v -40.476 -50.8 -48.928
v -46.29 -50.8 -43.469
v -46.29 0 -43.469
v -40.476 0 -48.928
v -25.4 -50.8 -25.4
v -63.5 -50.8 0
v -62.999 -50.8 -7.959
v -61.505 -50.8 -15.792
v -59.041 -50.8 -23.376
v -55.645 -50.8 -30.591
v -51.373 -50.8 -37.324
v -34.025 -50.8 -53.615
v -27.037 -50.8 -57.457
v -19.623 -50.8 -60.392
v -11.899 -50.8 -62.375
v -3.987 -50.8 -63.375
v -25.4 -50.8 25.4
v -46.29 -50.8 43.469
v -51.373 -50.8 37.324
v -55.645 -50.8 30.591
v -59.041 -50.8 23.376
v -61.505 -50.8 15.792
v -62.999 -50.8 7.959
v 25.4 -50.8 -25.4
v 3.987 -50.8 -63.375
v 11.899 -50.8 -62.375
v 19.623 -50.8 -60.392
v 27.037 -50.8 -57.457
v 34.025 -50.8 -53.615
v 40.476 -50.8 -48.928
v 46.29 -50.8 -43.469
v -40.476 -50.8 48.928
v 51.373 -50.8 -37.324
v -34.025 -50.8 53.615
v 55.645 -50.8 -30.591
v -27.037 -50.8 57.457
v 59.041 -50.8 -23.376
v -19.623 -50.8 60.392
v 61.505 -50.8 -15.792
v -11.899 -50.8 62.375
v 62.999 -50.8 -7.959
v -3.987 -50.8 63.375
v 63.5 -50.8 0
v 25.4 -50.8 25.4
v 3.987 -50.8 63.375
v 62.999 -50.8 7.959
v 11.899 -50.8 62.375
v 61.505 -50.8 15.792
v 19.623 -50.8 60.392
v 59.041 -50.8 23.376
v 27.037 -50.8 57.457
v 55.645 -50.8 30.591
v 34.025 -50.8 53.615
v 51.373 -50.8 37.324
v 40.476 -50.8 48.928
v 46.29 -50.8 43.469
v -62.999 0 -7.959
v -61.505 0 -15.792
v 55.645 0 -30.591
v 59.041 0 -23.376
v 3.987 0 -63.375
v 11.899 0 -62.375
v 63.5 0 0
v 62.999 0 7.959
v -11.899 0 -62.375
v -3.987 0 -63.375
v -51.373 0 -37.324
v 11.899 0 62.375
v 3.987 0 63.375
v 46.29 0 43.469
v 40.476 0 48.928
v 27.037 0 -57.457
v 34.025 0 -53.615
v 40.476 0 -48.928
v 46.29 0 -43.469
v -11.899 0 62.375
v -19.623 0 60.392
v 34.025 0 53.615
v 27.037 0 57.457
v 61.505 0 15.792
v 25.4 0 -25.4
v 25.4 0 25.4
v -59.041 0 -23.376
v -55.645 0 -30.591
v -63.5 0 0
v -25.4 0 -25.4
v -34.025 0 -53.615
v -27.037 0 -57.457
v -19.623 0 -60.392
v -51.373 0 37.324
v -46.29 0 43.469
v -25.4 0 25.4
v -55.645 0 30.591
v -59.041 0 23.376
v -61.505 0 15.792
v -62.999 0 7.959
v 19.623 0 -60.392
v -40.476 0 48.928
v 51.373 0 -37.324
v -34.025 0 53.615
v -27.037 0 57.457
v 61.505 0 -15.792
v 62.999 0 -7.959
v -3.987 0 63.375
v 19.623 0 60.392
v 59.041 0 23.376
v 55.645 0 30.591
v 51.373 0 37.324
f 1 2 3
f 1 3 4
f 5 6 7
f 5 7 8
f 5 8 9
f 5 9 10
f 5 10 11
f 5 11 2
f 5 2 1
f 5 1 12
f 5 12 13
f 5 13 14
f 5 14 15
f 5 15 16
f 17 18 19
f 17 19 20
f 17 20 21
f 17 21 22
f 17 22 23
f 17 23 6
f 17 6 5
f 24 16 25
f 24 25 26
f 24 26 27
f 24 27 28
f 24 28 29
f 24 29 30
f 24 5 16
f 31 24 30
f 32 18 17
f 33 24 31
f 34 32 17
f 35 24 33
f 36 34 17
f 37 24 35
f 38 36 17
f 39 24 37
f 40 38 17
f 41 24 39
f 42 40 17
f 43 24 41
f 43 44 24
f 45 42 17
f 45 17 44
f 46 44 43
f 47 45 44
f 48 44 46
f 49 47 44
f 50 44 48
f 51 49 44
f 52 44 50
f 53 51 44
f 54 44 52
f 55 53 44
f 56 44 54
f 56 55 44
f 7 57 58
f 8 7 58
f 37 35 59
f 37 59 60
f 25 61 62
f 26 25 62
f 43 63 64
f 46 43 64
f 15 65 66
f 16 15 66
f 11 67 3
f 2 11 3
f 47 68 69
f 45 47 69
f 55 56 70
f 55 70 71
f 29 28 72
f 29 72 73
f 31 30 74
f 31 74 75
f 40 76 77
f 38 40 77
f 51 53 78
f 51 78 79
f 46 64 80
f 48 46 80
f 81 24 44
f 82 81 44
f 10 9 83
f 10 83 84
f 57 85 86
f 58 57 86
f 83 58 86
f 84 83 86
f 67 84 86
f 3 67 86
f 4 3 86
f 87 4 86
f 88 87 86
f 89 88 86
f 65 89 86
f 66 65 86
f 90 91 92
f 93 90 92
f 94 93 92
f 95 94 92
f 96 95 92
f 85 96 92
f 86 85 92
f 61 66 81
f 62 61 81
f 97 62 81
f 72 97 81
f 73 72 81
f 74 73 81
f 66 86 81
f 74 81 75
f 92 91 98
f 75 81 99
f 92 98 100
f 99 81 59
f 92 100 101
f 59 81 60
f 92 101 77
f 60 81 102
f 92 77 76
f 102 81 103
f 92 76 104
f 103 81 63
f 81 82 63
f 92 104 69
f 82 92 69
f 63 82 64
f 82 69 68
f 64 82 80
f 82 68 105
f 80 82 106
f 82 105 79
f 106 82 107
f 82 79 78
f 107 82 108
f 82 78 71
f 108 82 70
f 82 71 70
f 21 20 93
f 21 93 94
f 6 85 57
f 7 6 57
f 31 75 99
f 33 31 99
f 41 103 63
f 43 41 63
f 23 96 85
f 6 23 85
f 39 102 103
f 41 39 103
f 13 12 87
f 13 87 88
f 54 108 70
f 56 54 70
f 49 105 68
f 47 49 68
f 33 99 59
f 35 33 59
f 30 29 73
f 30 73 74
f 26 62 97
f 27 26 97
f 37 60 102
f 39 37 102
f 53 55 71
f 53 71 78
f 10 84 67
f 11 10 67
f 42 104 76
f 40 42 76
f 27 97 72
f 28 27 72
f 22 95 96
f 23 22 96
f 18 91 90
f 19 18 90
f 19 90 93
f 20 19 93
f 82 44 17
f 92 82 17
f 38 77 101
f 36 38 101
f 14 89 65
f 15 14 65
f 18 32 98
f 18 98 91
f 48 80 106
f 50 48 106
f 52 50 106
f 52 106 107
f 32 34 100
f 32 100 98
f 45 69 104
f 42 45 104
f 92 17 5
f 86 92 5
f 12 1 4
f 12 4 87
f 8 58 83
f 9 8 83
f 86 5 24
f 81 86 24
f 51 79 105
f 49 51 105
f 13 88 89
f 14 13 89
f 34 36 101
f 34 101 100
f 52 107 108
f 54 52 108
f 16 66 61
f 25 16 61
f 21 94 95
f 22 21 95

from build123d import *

# Parameters (mm, degrees)
F1_DEPTH = 50.8
F3_DEPTH = 76.2


with BuildPart() as f1:
    # F0 (on Front) → F1 (new body)
    with BuildSketch(Plane.XZ):
        Polygon((3.987198, 63.374697), (-3.987198, 63.374697), (-11.898713, 62.37524), (-19.622579, 60.392089), (-27.036985, 57.456518), (-34.025001, 53.614823), (-40.476423, 48.927591), (-46.289508, 43.468741), (-51.372579, 37.324364), (-55.645474, 30.591358), (-59.040807, 23.375909), (-61.505031, 15.791808), (-62.999284, 7.95866), (-63.5, 0), (-62.999284, -7.95866), (-61.505031, -15.791808), (-59.040807, -23.375909), (-55.645474, -30.591358), (-51.372579, -37.324364), (-46.289508, -43.468741), (-40.476423, -48.927591), (-34.025001, -53.614823), (-27.036985, -57.456518), (-19.622579, -60.392089), (-11.898713, -62.37524), (-3.987198, -63.374697), (3.987198, -63.374697), (11.898713, -62.37524), (19.622579, -60.392089), (27.036985, -57.456518), (34.025001, -53.614823), (40.476423, -48.927591), (46.289508, -43.468741), (51.372579, -37.324364), (55.645474, -30.591358), (59.040807, -23.375909), (61.505031, -15.791808), (62.999284, -7.95866), (63.5, 0), (62.999284, 7.95866), (61.505031, 15.791808), (59.040807, 23.375909), (55.645474, 30.591358), (51.372579, 37.324364), (46.289508, 43.468741), (40.476423, 48.927591), (34.025001, 53.614823), (27.036985, 57.456518), (19.622579, 60.392089), (11.898713, 62.37524), align=None)
    extrude(amount=F1_DEPTH)

    # F2 (on face) → F3 (cut)
    with BuildSketch(Plane.XZ.offset(50.8)):
        Polygon((25.4, 25.4), (0, 25.4), (-25.4, 25.4), (-25.4, 0), (-25.4, -25.4), (0, -25.4), (25.4, -25.4), (25.4, 0), align=None)
    extrude(amount=-F3_DEPTH, mode=Mode.SUBTRACT)


solid = f1.part
